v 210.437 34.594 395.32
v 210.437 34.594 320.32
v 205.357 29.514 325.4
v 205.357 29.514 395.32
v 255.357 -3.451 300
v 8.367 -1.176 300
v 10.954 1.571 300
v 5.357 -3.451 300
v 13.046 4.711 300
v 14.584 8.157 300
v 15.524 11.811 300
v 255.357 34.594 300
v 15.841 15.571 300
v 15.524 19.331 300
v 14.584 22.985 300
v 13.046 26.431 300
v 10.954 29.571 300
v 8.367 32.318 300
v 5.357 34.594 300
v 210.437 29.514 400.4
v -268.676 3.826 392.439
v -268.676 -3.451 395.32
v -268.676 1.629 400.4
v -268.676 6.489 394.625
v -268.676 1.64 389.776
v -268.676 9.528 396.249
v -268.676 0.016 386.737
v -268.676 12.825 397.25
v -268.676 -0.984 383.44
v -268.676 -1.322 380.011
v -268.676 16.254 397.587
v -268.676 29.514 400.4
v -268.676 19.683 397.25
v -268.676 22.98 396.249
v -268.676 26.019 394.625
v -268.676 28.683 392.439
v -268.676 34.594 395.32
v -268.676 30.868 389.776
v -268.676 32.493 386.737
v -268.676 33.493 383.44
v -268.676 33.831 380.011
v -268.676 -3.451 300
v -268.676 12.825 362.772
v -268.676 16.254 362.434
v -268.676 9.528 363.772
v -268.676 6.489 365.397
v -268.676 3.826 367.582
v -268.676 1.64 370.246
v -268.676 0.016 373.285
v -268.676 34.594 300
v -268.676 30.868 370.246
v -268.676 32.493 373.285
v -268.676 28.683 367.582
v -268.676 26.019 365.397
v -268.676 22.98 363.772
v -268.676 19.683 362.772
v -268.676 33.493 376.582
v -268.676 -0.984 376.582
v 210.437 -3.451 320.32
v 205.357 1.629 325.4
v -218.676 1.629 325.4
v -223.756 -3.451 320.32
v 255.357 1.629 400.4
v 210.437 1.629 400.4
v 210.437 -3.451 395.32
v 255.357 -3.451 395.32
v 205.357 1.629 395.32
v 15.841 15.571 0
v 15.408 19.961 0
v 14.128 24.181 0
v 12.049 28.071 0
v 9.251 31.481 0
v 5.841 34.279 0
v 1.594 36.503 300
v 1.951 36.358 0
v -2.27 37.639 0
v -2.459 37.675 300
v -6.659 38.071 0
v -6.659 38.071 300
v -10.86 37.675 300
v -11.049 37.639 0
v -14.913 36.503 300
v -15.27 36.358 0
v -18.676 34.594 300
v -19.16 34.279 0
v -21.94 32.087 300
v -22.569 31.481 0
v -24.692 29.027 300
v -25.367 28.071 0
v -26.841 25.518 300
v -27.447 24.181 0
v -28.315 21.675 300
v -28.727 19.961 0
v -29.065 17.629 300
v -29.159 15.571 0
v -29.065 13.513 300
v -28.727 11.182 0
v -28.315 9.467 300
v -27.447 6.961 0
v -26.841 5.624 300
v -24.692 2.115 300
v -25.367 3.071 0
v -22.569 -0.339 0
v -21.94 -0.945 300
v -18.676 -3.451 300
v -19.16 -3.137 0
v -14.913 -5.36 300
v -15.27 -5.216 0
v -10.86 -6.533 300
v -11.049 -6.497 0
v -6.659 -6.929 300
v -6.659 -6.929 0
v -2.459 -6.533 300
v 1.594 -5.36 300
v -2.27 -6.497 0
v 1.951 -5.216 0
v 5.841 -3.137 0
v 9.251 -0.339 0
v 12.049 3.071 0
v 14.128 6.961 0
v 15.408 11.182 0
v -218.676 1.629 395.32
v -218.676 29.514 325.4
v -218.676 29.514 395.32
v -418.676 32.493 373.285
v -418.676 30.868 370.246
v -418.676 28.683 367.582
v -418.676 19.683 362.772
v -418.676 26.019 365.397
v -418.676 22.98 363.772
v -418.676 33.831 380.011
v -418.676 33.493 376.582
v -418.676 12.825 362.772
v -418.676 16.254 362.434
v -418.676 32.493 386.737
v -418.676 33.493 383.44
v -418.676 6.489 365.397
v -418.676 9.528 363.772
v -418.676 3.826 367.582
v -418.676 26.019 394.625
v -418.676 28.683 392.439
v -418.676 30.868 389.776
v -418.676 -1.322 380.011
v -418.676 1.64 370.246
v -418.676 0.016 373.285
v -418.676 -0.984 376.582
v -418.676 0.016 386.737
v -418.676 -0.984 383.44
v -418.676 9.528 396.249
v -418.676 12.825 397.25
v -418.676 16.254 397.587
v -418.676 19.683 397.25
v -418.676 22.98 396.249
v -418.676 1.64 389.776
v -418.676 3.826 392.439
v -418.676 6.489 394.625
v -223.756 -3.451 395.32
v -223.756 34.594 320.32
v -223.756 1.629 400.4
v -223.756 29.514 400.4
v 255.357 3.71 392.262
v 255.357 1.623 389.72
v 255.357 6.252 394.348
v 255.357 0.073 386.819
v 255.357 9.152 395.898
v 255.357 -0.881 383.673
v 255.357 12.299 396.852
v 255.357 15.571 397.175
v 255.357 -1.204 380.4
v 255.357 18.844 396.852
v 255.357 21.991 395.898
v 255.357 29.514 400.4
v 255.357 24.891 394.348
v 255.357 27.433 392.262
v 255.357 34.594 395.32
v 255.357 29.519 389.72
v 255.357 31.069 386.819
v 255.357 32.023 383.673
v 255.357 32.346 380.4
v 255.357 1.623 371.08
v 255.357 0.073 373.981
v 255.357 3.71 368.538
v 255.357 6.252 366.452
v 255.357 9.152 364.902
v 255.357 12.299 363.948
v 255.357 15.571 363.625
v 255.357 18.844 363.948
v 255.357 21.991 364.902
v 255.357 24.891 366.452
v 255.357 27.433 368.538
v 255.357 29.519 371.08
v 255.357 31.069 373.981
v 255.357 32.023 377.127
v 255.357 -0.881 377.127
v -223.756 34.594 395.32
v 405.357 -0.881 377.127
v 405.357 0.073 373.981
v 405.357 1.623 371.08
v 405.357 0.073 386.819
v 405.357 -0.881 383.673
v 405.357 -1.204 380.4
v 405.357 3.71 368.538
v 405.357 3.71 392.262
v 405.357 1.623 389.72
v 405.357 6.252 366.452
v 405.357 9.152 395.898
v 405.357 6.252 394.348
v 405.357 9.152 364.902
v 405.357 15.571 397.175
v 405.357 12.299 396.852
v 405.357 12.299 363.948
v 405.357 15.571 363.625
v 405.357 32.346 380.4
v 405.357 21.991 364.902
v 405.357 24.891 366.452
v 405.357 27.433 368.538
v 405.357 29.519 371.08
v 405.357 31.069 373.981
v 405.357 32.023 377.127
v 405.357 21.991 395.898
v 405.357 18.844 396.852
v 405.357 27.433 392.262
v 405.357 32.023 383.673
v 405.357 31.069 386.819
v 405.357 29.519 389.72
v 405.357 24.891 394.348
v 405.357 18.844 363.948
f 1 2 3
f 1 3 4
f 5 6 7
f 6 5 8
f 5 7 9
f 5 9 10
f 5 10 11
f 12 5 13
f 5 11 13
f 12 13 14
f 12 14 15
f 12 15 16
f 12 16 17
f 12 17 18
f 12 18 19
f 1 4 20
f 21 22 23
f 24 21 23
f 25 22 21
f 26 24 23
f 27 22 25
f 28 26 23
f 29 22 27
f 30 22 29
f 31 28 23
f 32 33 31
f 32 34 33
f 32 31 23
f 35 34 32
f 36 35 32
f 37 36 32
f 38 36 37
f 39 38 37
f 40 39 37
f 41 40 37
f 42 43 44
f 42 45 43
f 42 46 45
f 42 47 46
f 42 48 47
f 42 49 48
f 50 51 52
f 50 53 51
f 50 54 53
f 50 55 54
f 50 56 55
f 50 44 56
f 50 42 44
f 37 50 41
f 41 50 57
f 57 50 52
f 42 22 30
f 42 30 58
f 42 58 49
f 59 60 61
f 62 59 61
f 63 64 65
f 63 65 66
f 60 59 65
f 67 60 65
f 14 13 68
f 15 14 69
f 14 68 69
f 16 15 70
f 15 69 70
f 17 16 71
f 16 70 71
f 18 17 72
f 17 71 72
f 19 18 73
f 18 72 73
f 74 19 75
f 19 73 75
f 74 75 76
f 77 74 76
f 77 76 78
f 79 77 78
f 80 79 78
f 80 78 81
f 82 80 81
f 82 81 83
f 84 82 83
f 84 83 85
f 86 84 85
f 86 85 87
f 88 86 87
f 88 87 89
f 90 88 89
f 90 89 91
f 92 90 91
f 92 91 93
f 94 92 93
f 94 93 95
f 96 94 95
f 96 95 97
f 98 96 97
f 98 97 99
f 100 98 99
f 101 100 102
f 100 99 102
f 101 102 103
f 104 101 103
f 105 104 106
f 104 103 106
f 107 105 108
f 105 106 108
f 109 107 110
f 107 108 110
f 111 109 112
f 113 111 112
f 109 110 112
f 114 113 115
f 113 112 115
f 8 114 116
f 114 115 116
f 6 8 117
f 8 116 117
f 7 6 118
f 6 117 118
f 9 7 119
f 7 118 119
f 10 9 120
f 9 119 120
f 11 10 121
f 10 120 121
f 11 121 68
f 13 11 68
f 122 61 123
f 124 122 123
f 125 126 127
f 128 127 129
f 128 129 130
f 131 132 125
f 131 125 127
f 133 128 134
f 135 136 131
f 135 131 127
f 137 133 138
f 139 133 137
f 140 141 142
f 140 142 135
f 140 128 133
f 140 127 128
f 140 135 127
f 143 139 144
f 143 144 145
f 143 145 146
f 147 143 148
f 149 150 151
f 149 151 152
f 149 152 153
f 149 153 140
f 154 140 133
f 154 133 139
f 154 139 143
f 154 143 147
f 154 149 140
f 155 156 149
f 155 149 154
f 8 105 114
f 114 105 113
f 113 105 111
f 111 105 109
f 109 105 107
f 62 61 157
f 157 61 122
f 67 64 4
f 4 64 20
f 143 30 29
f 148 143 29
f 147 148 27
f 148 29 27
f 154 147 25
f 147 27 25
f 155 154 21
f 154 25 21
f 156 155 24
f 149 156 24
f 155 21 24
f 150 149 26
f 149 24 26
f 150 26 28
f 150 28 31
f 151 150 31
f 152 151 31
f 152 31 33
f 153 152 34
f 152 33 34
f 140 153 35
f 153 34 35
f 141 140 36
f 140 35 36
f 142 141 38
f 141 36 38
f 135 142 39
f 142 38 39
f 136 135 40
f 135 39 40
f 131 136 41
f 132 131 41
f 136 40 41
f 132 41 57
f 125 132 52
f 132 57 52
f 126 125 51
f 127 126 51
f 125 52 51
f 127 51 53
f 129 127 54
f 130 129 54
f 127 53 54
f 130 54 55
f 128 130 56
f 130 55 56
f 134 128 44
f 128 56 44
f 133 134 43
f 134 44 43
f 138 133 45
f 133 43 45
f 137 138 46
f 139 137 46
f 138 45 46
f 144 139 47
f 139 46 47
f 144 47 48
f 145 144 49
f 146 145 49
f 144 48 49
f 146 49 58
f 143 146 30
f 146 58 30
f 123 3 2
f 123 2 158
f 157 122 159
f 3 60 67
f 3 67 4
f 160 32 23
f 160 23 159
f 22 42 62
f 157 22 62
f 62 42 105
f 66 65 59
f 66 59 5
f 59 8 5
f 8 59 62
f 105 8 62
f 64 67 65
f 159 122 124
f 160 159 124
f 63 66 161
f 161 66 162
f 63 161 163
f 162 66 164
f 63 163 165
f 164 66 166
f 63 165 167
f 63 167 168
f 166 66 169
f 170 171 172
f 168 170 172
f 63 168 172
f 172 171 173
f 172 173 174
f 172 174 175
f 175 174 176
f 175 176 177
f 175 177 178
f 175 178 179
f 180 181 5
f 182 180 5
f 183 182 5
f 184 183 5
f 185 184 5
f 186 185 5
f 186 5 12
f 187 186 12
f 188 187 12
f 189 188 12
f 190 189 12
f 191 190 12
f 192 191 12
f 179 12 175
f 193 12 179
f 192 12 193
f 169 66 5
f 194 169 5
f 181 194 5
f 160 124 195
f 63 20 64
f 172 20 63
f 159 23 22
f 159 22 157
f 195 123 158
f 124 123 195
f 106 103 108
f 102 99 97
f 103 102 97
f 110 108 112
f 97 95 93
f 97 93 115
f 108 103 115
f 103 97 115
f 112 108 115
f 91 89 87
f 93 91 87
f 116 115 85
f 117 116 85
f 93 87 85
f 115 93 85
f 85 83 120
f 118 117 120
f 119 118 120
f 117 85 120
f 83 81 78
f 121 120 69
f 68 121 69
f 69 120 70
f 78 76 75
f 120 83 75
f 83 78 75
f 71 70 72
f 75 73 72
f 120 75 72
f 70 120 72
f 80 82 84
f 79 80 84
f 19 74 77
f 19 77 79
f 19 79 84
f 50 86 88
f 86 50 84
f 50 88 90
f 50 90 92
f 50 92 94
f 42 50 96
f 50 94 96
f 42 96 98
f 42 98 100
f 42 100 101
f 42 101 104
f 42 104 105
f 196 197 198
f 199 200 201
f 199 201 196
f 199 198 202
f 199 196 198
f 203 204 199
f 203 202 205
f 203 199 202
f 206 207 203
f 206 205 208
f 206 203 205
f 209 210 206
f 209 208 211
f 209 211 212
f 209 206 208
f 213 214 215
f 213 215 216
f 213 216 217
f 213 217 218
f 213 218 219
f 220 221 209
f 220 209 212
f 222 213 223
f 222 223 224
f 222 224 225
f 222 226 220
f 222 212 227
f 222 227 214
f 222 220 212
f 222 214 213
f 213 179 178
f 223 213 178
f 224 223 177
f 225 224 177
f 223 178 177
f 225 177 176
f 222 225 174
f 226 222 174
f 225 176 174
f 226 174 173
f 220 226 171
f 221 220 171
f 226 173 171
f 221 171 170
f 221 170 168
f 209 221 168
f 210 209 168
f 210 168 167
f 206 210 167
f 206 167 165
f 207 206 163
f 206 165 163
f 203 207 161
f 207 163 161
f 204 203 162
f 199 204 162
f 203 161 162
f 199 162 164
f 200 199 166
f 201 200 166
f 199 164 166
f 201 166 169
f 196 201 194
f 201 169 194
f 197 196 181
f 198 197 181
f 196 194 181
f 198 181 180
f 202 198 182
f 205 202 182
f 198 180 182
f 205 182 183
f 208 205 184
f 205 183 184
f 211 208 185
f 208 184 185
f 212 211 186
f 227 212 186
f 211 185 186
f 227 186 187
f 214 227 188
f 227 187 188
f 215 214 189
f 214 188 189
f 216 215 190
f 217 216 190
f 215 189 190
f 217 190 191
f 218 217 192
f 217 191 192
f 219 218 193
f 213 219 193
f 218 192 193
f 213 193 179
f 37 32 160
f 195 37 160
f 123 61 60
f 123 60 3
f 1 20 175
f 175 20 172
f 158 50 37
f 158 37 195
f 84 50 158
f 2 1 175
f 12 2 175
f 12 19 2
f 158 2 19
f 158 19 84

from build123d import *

# Parameters (mm, degrees)
F0_R      = 22.5
F1_DEPTH  = 300
F2_W      = 24.0328347509
F2_H      = 38.0450108928
F3_DEPTH  = 25.4
F4_W      = 38.0450108928
F4_H      = 25.4
F5_DEPTH  = 250
F6_W      = 50
F6_H      = 38.0450108928
F7_DEPTH  = 75
F9_W      = 38.0450108928
F9_H      = 25.4
F10_DEPTH = 250
F11_W     = 50
F11_H     = 38.0450108928
F12_DEPTH = 75
F13_R     = 16.7747006108
F14_DEPTH = 150
F8_R      = 17.5763954382
F15_DEPTH = 150
F16_SIZE  = 5.08


with BuildPart() as f1:
    # F0 (on Top) → F1 (new body)
    with BuildSketch(Plane.XY):
        with Locations((-6.6593382508, 15.5711015686)):
            Circle(F0_R)
    extrude(amount=F1_DEPTH)

    # F2 (on face) → F3 (join)
    with BuildSketch(Plane.XY.offset(300)):
        with Locations((-6.6593382508, 15.5711015686)):
            Rectangle(F2_W, F2_H)
    extrude(amount=F3_DEPTH)

    # F4 (on face) → F5 (join)
    with BuildSketch(Plane(origin=(-18.6757556262, 0, 0), x_dir=(0, -1, 0), z_dir=(-1, 0, 0))):
        with Locations((-15.5711015686, 312.7)):
            Rectangle(F4_W, F4_H)
    extrude(amount=F5_DEPTH)

    # F6 (on face) → F7 (join)
    with BuildSketch(Plane.XY.offset(325.4)):
        with Locations((-243.6757556262, 15.5711015686)):
            Rectangle(F6_W, F6_H)
    extrude(amount=F7_DEPTH)

    # F9 (on face) → F10 (join)
    with BuildSketch(Plane.YZ.offset(5.3570791247)):
        with Locations((15.5711015686, 312.7)):
            Rectangle(F9_W, F9_H)
    extrude(amount=F10_DEPTH)

    # F11 (on face) → F12 (join)
    with BuildSketch(Plane.XY.offset(325.4)):
        with Locations((230.3570791247, 15.5711015686)):
            Rectangle(F11_W, F11_H)
    extrude(amount=F12_DEPTH)

    # F13 (on face) → F14 (join)
    with BuildSketch(Plane.YZ.offset(255.3570791247)):
        with Locations((15.5711015686, 380.4)):
            Circle(F13_R)
    extrude(amount=F14_DEPTH)

    # F8 (on face) → F15 (join)
    with BuildSketch(Plane(origin=(-268.6757556262, 0, 0), x_dir=(0, -1, 0), z_dir=(-1, 0, 0))):
        with Locations((-16.2542480975, 380.010843277)):
            Circle(F8_R)
    extrude(amount=F15_DEPTH)

    # F16
    f16_edges = [f1.edges().sort_by_distance(p)[0] for p in [
        (-6.659338, -3.451404, 325.4),
        (-6.659338, 34.593607, 325.4),
        (-218.675756, -3.451404, 362.9),
        (-218.675756, 34.593607, 362.9),
        (205.357079, -3.451404, 362.9),
        (205.357079, 34.593607, 362.9),
        (205.357079, 15.571102, 400.4),
        (-218.675756, 15.571102, 400.4),
        (-243.675756, -3.451404, 400.4),
        (-243.675756, 34.593607, 400.4),
        (230.357079, 34.593607, 400.4),
        (230.357079, -3.451404, 400.4),
    ]]
    chamfer(f16_edges, length=F16_SIZE)


solid = f1.part
